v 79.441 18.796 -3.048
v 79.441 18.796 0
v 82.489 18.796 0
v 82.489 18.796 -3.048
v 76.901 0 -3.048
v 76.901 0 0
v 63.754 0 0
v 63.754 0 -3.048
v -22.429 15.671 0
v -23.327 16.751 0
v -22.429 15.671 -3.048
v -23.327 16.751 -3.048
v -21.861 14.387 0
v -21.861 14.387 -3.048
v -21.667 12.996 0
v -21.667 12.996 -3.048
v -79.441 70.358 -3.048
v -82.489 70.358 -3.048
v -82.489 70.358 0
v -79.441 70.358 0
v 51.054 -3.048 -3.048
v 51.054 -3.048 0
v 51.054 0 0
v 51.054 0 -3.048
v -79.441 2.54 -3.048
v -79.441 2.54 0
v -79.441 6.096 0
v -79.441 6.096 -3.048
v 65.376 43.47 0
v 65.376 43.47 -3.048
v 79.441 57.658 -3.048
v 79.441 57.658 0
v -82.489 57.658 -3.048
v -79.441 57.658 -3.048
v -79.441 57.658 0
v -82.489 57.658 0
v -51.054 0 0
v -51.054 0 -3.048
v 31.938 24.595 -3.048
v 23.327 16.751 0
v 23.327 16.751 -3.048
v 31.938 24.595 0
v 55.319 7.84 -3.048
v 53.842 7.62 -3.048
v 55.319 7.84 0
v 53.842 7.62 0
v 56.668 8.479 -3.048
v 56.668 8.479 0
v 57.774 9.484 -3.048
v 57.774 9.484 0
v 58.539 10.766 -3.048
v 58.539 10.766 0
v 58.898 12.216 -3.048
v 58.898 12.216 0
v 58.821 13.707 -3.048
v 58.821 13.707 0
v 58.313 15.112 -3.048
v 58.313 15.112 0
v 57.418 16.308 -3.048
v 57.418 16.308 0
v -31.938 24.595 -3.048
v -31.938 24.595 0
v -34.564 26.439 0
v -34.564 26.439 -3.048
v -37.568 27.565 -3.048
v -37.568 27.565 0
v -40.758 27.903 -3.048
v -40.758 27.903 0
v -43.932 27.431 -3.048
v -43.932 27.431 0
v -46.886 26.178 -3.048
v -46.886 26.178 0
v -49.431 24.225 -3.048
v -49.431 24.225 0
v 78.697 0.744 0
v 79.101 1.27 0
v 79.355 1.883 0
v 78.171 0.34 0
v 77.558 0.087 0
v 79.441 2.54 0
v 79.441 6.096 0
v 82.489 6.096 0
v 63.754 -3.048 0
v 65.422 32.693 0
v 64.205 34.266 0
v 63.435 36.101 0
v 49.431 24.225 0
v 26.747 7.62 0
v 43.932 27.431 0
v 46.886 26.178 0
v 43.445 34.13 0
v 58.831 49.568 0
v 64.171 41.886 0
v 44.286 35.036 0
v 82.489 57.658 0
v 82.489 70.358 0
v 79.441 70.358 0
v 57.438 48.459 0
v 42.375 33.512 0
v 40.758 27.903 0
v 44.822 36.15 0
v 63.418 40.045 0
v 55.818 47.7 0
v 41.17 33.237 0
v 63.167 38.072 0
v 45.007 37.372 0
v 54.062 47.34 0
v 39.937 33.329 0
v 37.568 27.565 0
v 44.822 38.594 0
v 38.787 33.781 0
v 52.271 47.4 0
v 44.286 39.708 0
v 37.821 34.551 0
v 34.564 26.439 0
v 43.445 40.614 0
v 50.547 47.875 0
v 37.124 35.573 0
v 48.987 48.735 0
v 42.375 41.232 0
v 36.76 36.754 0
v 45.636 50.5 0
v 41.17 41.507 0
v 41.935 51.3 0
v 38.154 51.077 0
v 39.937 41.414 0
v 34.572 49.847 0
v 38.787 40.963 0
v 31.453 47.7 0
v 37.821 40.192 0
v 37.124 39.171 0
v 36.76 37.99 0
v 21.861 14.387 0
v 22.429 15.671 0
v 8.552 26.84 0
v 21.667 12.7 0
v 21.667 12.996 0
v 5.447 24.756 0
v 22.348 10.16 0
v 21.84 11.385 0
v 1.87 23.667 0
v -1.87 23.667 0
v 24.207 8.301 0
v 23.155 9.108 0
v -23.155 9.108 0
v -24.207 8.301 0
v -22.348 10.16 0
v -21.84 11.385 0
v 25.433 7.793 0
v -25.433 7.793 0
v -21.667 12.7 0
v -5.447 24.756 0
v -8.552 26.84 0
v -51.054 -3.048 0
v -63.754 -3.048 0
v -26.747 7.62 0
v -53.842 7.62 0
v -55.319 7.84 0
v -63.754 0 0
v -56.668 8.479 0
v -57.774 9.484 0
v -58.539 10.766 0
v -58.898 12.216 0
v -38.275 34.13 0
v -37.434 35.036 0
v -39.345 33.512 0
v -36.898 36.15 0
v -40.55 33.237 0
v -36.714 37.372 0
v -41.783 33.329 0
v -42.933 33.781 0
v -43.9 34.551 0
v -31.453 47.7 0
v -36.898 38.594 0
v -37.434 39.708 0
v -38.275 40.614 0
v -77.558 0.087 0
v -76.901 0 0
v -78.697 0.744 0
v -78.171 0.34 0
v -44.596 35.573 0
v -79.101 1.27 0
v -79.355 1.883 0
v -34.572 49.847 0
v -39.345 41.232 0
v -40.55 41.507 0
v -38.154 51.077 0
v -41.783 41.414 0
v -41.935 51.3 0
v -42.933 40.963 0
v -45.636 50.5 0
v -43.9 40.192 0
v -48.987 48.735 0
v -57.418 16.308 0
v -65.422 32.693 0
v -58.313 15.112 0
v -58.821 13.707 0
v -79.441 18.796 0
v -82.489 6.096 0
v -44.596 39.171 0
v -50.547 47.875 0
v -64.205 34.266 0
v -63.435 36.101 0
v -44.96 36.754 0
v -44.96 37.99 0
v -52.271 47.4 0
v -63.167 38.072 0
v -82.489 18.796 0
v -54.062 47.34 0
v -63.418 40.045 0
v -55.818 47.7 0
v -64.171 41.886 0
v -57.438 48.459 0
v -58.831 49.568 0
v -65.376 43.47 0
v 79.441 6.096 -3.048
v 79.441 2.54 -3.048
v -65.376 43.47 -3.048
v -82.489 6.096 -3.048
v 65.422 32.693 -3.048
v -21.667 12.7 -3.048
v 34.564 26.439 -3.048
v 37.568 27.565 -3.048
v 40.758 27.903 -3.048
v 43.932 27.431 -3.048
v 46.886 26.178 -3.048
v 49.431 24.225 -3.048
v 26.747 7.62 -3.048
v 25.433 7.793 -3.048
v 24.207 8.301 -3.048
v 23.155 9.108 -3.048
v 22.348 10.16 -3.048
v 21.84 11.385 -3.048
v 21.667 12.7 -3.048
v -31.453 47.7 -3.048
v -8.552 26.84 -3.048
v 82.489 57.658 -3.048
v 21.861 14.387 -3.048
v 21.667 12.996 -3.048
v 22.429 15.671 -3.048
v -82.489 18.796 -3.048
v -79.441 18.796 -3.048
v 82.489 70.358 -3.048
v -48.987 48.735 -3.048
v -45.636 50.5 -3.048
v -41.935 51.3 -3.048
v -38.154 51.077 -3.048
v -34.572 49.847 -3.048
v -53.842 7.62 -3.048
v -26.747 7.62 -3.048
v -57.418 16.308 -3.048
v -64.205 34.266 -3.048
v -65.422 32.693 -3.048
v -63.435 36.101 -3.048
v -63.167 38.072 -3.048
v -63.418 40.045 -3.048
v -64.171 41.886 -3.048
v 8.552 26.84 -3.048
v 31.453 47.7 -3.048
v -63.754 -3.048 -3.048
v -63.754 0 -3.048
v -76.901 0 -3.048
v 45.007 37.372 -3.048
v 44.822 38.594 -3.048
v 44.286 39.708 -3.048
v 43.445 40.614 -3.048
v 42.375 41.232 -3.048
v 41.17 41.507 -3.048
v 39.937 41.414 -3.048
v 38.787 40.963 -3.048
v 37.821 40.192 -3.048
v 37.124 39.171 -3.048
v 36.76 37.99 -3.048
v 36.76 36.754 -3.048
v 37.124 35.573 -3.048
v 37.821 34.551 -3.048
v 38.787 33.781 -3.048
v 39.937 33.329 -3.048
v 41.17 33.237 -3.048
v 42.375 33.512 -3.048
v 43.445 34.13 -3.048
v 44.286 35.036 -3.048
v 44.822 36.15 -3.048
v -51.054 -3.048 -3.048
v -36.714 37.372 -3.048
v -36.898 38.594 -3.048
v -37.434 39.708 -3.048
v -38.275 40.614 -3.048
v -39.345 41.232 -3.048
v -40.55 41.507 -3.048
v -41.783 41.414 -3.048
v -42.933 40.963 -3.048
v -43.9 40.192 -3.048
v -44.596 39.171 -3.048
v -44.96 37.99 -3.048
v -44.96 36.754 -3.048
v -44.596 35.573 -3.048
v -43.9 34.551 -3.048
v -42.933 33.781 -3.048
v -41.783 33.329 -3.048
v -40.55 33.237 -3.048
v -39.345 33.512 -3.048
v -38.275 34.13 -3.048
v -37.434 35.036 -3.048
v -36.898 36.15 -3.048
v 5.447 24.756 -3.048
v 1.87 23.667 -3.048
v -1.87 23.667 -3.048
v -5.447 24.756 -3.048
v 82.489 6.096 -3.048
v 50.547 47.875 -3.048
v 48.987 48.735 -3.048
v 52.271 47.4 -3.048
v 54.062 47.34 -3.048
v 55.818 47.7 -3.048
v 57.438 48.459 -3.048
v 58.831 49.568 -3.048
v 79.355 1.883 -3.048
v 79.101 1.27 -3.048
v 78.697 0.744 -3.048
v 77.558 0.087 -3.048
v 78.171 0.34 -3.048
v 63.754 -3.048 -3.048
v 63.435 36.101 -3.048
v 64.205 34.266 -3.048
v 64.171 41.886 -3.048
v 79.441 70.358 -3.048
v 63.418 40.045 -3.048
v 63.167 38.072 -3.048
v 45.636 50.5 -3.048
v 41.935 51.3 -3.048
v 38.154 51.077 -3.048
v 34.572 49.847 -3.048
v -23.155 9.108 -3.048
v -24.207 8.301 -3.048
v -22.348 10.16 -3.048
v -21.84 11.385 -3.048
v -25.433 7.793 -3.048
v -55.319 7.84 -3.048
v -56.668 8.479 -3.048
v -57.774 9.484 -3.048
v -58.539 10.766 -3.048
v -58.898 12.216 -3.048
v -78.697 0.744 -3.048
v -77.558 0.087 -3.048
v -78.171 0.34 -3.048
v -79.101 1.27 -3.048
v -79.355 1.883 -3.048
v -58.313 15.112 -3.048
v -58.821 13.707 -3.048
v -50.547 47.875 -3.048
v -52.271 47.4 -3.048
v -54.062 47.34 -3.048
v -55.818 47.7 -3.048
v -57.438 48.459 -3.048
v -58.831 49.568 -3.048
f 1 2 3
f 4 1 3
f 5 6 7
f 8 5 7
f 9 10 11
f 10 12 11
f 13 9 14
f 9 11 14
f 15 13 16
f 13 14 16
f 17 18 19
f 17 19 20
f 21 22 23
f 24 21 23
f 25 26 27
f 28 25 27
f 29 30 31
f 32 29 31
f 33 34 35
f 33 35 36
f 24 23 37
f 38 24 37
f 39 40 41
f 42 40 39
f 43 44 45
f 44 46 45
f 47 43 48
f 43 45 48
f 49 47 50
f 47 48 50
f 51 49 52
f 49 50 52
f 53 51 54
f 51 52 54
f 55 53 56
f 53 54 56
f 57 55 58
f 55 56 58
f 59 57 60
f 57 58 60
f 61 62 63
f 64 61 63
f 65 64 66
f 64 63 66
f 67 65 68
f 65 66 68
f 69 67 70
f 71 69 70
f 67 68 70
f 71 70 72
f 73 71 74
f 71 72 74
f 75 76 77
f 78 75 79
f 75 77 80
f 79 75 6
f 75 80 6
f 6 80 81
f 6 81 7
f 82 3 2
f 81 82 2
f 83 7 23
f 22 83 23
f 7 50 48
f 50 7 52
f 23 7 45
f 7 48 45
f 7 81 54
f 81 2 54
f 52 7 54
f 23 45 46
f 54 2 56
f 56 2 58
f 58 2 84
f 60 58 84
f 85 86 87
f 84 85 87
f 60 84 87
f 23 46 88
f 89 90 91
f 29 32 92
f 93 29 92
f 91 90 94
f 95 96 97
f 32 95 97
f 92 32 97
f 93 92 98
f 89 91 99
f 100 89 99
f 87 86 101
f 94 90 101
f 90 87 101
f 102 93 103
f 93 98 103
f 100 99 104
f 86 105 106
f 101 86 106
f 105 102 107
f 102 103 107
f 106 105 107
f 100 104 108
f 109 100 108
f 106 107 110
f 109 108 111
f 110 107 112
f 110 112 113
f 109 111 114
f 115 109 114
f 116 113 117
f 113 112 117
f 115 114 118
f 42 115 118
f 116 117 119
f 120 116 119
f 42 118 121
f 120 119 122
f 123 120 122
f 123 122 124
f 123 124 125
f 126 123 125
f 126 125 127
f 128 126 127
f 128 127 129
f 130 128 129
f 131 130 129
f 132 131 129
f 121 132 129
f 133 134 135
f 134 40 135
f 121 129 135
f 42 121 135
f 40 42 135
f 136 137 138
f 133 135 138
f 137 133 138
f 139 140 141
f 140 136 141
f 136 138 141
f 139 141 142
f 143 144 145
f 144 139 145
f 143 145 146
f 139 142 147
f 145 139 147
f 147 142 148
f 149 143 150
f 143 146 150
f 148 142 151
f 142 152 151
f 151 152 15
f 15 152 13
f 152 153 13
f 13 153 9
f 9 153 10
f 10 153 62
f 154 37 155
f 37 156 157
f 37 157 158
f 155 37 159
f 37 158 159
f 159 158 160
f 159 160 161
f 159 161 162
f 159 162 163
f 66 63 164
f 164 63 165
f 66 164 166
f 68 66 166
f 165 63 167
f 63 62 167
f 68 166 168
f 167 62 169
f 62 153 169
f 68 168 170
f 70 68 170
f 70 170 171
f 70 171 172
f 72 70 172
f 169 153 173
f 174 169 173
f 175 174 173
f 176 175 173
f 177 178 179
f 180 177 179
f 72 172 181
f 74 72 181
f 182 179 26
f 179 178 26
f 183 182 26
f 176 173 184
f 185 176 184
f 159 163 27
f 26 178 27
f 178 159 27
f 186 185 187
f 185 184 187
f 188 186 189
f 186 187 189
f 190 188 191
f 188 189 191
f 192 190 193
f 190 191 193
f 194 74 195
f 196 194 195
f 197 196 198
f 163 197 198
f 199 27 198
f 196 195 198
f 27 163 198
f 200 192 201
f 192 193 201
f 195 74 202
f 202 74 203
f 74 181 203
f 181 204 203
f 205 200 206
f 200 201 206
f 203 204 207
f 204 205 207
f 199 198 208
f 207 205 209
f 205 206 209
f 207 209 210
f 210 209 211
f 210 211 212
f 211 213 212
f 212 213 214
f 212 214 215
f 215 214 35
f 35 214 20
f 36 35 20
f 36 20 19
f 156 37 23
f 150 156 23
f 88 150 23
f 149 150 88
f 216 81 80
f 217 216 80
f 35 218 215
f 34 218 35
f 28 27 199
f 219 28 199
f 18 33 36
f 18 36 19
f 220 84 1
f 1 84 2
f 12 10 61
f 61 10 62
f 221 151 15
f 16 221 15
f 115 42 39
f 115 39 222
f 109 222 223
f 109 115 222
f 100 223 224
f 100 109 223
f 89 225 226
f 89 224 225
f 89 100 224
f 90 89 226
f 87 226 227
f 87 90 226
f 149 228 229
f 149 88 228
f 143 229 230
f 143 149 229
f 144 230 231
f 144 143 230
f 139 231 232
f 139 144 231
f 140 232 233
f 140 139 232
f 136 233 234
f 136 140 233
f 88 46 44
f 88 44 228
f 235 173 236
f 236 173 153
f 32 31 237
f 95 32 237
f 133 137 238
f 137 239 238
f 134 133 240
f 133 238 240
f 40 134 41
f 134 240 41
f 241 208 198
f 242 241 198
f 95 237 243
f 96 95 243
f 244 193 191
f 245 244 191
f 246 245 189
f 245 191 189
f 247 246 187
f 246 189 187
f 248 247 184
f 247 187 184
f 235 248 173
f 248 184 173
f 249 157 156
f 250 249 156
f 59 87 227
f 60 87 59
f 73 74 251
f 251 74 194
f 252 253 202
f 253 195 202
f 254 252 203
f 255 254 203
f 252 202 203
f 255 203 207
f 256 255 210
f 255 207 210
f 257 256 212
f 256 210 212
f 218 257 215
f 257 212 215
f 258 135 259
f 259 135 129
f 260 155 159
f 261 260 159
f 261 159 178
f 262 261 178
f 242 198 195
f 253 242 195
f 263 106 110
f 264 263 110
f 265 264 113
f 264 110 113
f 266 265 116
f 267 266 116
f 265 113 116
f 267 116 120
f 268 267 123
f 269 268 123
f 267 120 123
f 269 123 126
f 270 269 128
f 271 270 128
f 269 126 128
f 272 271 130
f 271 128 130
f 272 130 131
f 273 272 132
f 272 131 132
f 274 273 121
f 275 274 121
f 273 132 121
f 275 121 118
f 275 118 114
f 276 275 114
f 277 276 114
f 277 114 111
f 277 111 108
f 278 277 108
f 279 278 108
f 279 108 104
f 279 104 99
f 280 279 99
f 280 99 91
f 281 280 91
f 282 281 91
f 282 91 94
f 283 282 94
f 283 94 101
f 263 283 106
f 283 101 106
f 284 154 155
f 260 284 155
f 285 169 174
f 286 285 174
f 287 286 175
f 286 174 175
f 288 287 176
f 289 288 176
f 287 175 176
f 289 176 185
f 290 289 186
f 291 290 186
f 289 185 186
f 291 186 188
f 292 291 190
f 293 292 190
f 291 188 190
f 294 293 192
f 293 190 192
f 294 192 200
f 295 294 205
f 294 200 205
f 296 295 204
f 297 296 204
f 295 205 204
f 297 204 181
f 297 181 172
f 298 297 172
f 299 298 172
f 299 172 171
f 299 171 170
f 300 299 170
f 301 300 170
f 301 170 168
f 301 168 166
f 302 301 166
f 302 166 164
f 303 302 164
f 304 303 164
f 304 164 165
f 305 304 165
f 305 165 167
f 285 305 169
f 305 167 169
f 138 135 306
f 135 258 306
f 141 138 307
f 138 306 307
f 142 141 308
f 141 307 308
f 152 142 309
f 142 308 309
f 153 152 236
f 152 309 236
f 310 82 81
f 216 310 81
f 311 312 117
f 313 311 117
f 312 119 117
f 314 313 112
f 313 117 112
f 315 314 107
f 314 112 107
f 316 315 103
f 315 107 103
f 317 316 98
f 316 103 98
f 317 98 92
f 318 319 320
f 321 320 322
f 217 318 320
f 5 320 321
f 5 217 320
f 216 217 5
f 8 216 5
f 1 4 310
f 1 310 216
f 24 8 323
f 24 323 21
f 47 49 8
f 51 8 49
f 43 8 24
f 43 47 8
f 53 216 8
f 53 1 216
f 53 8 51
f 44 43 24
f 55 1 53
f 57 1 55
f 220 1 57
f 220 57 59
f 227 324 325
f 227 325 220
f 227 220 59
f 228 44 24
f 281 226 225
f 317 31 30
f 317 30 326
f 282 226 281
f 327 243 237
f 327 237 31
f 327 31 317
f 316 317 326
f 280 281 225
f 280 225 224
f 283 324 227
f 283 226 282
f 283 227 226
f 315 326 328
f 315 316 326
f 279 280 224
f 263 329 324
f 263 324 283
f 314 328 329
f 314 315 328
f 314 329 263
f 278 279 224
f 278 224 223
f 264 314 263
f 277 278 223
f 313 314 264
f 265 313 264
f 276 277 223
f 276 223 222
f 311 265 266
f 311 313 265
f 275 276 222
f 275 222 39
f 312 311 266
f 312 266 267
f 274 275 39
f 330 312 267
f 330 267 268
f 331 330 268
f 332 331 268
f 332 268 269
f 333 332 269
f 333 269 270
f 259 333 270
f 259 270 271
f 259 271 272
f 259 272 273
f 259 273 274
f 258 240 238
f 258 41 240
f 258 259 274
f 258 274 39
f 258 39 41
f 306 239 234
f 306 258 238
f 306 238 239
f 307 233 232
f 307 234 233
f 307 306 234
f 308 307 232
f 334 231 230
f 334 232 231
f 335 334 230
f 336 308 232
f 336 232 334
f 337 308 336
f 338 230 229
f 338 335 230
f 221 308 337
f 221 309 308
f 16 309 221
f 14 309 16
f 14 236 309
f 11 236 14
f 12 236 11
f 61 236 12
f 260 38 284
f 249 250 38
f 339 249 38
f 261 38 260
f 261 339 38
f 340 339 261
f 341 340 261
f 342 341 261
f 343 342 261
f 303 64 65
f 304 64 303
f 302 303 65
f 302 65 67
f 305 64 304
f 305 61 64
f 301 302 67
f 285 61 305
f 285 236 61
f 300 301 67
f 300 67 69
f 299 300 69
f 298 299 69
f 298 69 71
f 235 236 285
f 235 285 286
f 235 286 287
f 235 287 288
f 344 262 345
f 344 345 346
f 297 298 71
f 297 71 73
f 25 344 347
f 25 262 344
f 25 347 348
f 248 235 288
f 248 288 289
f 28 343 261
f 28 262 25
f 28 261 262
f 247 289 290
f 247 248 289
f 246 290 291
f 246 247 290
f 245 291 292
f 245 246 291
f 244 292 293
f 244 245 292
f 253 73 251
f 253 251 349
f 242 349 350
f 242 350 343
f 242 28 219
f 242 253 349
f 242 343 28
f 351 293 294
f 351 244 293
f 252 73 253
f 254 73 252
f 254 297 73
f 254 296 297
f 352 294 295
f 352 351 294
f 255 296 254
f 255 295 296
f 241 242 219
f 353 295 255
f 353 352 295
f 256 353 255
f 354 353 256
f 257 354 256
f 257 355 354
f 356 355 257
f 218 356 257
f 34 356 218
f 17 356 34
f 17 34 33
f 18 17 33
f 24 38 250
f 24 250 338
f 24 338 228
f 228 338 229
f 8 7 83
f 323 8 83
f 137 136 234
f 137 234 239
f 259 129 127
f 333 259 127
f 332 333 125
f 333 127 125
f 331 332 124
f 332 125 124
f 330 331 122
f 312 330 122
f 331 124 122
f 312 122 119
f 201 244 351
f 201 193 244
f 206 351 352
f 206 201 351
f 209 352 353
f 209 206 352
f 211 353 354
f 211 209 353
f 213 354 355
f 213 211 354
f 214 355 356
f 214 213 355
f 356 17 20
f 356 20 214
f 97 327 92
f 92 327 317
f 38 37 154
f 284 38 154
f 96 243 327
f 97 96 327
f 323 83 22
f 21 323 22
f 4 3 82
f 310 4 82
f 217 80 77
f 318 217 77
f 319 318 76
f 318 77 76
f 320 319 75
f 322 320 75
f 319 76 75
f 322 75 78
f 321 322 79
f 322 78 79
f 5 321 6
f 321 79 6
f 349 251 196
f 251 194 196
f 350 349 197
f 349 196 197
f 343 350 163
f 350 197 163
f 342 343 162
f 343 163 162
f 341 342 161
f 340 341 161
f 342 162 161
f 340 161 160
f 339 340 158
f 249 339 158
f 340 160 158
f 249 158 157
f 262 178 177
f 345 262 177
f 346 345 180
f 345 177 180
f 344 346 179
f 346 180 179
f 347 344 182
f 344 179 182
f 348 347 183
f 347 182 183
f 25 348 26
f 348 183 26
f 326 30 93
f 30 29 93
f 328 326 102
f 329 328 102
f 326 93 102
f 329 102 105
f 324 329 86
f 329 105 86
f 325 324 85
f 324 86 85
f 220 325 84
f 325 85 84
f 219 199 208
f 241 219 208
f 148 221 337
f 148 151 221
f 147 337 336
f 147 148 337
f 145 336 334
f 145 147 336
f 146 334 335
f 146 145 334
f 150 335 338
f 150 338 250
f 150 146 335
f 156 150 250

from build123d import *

# Parameters (mm, degrees)
SKETCH1_R            = 4.14655
BOSS_EXTRUDE1_DEPTH  = 3.048
FILLET1_R            = 12.7
CUT_EXTRUDE1_DEPTH   = 98.209690942
FILLET2_R            = 5.08
FILLET2_OF_MIRROR1_R = 5.08
BOSS_EXTRUDE2_DEPTH  = 3.048
FILLET3_R            = 7.62


with BuildPart() as part:
    # Sketch1 → Boss-Extrude1 (new body)
    with BuildSketch(Plane.XY):
        with BuildLine():
            Line((51.054, 0), (-51.054, 0))
            Line((-51.054, 0), (-51.054, -3.048))
            Line((-51.054, -3.048), (-63.754, -3.048))
            Line((-63.754, -3.048), (-63.754, 0))
            Line((-63.754, 0), (-76.901088515, 0))
            ThreePointArc((-76.901088515, 0), (-78.697139739, 0.743948776), (-79.441088515, 2.54))
            Line((-79.441088515, 2.54), (-79.441088515, 6.096))
            Line((-79.441088515, 6.096), (-82.489088515, 6.096))
            Line((-82.489088515, 6.096), (-82.489088515, 18.796))
            Line((-82.489088515, 18.796), (-79.441088515, 18.796))
            Line((-79.441088515, 18.796), (-50.69543442, 47.292942568))
            ThreePointArc((-50.69543442, 47.292942568), (-41.155344062, 51.338715816), (-31.452840209, 47.699619198))
            Line((-31.452840209, 47.699619198), (0, 19.05))
            Line((0, 19.05), (31.452840209, 47.699619198))
            ThreePointArc((31.452840209, 47.699619198), (41.155344062, 51.338715816), (50.69543442, 47.292942568))
            Line((50.69543442, 47.292942568), (79.441088515, 18.796))
            Line((79.441088515, 18.796), (82.489088515, 18.796))
            Line((82.489088515, 18.796), (82.489088515, 6.096))
            Line((82.489088515, 6.096), (79.441088515, 6.096))
            Line((79.441088515, 6.096), (79.441088515, 2.54))
            ThreePointArc((79.441088515, 2.54), (78.697139739, 0.743948776), (76.901088515, 0))
            Line((76.901088515, 0), (63.754, 0))
            Line((63.754, 0), (63.754, -3.048))
            Line((63.754, -3.048), (51.054, -3.048))
            Line((51.054, -3.048), (51.054, 0))
        make_face()
        with Locations((40.860165351, 37.371834649)):
            Circle(SKETCH1_R, mode=Mode.SUBTRACT)
        with Locations((-40.860165351, 37.371834649)):
            Circle(SKETCH1_R, mode=Mode.SUBTRACT)
    extrude(amount=-BOSS_EXTRUDE1_DEPTH)

    # Fillet1
    fillet1_edges = [part.edges().sort_by_distance(p)[0] for p in [
        (0, 19.05, -1.524),
    ]]
    fillet(fillet1_edges, radius=FILLET1_R)

    # Sketch3 → Cut-Extrude1 (cut, symmetric)
    with BuildSketch(Plane.XY):
        with BuildLine():
            Line((-49.43113261, 24.225449161), (-66.181508428, 7.62))
            Line((-66.181508428, 7.62), (-21.667355118, 7.62))
            Line((-21.667355118, 7.62), (-21.667355118, 15.24))
            Line((-21.667355118, 15.24), (-31.937865146, 24.595155188))
            ThreePointArc((-31.937865146, 24.595155188), (-40.758323194, 27.903424841), (-49.43113261, 24.225449161))
        make_face()
    cut_extrude1 = extrude(amount=CUT_EXTRUDE1_DEPTH, both=True, mode=Mode.SUBTRACT)

    # Fillet2
    fillet2_edges = [part.edges().sort_by_distance(p)[0] for p in [
        (-21.667355118, 7.62, -1.524),
        (-66.181508428, 7.62, -1.524),
        (-21.667355118, 15.24, -1.524),
    ]]
    fillet(fillet2_edges, radius=FILLET2_R)

    # Mirror1: Cut-Extrude1 across plane
    add(cut_extrude1.mirror(Plane(origin=(0, 0, 0), x_dir=(0, 0, 1), z_dir=(1, 0, 0))), mode=Mode.SUBTRACT)

    # Fillet2 of Mirror1
    fillet2_of_mirror1_edges = [part.edges().sort_by_distance(p)[0] for p in [
        (21.667355118, 7.62, -1.524),
        (66.181508428, 7.62, -1.524),
        (21.667355118, 15.24, -1.524),
    ]]
    fillet(fillet2_of_mirror1_edges, radius=FILLET2_OF_MIRROR1_R)

    # Sketch4 → Boss-Extrude2 (add)
    with BuildSketch(Plane(origin=(0, 0, -3.048), x_dir=(-1, 0, 0), z_dir=(0, 0, -1))):
        Polygon((-82.489088515, 70.358), (-79.441088515, 70.358), (-53.661061877, 44.352974145), (-60.010822133, 38.058152927), (-79.441088515, 57.658), (-82.489088515, 57.658), align=None)
    boss_extrude2 = extrude(amount=-BOSS_EXTRUDE2_DEPTH)

    # Mirror3: Boss-Extrude2 across plane
    add(boss_extrude2.mirror(Plane(origin=(0, 0, 0), x_dir=(0, 0, 1), z_dir=(1, 0, 0))))

    # Fillet3
    fillet3_edges = [part.edges().sort_by_distance(p)[0] for p in [
        (60.010822133, 38.058152927, -1.524),
        (53.661061877, 44.352974145, -1.524),
        (-60.010822133, 38.058152927, -1.524),
        (-53.661061877, 44.352974145, -1.524),
    ]]
    fillet(fillet3_edges, radius=FILLET3_R)


solid = part.part
